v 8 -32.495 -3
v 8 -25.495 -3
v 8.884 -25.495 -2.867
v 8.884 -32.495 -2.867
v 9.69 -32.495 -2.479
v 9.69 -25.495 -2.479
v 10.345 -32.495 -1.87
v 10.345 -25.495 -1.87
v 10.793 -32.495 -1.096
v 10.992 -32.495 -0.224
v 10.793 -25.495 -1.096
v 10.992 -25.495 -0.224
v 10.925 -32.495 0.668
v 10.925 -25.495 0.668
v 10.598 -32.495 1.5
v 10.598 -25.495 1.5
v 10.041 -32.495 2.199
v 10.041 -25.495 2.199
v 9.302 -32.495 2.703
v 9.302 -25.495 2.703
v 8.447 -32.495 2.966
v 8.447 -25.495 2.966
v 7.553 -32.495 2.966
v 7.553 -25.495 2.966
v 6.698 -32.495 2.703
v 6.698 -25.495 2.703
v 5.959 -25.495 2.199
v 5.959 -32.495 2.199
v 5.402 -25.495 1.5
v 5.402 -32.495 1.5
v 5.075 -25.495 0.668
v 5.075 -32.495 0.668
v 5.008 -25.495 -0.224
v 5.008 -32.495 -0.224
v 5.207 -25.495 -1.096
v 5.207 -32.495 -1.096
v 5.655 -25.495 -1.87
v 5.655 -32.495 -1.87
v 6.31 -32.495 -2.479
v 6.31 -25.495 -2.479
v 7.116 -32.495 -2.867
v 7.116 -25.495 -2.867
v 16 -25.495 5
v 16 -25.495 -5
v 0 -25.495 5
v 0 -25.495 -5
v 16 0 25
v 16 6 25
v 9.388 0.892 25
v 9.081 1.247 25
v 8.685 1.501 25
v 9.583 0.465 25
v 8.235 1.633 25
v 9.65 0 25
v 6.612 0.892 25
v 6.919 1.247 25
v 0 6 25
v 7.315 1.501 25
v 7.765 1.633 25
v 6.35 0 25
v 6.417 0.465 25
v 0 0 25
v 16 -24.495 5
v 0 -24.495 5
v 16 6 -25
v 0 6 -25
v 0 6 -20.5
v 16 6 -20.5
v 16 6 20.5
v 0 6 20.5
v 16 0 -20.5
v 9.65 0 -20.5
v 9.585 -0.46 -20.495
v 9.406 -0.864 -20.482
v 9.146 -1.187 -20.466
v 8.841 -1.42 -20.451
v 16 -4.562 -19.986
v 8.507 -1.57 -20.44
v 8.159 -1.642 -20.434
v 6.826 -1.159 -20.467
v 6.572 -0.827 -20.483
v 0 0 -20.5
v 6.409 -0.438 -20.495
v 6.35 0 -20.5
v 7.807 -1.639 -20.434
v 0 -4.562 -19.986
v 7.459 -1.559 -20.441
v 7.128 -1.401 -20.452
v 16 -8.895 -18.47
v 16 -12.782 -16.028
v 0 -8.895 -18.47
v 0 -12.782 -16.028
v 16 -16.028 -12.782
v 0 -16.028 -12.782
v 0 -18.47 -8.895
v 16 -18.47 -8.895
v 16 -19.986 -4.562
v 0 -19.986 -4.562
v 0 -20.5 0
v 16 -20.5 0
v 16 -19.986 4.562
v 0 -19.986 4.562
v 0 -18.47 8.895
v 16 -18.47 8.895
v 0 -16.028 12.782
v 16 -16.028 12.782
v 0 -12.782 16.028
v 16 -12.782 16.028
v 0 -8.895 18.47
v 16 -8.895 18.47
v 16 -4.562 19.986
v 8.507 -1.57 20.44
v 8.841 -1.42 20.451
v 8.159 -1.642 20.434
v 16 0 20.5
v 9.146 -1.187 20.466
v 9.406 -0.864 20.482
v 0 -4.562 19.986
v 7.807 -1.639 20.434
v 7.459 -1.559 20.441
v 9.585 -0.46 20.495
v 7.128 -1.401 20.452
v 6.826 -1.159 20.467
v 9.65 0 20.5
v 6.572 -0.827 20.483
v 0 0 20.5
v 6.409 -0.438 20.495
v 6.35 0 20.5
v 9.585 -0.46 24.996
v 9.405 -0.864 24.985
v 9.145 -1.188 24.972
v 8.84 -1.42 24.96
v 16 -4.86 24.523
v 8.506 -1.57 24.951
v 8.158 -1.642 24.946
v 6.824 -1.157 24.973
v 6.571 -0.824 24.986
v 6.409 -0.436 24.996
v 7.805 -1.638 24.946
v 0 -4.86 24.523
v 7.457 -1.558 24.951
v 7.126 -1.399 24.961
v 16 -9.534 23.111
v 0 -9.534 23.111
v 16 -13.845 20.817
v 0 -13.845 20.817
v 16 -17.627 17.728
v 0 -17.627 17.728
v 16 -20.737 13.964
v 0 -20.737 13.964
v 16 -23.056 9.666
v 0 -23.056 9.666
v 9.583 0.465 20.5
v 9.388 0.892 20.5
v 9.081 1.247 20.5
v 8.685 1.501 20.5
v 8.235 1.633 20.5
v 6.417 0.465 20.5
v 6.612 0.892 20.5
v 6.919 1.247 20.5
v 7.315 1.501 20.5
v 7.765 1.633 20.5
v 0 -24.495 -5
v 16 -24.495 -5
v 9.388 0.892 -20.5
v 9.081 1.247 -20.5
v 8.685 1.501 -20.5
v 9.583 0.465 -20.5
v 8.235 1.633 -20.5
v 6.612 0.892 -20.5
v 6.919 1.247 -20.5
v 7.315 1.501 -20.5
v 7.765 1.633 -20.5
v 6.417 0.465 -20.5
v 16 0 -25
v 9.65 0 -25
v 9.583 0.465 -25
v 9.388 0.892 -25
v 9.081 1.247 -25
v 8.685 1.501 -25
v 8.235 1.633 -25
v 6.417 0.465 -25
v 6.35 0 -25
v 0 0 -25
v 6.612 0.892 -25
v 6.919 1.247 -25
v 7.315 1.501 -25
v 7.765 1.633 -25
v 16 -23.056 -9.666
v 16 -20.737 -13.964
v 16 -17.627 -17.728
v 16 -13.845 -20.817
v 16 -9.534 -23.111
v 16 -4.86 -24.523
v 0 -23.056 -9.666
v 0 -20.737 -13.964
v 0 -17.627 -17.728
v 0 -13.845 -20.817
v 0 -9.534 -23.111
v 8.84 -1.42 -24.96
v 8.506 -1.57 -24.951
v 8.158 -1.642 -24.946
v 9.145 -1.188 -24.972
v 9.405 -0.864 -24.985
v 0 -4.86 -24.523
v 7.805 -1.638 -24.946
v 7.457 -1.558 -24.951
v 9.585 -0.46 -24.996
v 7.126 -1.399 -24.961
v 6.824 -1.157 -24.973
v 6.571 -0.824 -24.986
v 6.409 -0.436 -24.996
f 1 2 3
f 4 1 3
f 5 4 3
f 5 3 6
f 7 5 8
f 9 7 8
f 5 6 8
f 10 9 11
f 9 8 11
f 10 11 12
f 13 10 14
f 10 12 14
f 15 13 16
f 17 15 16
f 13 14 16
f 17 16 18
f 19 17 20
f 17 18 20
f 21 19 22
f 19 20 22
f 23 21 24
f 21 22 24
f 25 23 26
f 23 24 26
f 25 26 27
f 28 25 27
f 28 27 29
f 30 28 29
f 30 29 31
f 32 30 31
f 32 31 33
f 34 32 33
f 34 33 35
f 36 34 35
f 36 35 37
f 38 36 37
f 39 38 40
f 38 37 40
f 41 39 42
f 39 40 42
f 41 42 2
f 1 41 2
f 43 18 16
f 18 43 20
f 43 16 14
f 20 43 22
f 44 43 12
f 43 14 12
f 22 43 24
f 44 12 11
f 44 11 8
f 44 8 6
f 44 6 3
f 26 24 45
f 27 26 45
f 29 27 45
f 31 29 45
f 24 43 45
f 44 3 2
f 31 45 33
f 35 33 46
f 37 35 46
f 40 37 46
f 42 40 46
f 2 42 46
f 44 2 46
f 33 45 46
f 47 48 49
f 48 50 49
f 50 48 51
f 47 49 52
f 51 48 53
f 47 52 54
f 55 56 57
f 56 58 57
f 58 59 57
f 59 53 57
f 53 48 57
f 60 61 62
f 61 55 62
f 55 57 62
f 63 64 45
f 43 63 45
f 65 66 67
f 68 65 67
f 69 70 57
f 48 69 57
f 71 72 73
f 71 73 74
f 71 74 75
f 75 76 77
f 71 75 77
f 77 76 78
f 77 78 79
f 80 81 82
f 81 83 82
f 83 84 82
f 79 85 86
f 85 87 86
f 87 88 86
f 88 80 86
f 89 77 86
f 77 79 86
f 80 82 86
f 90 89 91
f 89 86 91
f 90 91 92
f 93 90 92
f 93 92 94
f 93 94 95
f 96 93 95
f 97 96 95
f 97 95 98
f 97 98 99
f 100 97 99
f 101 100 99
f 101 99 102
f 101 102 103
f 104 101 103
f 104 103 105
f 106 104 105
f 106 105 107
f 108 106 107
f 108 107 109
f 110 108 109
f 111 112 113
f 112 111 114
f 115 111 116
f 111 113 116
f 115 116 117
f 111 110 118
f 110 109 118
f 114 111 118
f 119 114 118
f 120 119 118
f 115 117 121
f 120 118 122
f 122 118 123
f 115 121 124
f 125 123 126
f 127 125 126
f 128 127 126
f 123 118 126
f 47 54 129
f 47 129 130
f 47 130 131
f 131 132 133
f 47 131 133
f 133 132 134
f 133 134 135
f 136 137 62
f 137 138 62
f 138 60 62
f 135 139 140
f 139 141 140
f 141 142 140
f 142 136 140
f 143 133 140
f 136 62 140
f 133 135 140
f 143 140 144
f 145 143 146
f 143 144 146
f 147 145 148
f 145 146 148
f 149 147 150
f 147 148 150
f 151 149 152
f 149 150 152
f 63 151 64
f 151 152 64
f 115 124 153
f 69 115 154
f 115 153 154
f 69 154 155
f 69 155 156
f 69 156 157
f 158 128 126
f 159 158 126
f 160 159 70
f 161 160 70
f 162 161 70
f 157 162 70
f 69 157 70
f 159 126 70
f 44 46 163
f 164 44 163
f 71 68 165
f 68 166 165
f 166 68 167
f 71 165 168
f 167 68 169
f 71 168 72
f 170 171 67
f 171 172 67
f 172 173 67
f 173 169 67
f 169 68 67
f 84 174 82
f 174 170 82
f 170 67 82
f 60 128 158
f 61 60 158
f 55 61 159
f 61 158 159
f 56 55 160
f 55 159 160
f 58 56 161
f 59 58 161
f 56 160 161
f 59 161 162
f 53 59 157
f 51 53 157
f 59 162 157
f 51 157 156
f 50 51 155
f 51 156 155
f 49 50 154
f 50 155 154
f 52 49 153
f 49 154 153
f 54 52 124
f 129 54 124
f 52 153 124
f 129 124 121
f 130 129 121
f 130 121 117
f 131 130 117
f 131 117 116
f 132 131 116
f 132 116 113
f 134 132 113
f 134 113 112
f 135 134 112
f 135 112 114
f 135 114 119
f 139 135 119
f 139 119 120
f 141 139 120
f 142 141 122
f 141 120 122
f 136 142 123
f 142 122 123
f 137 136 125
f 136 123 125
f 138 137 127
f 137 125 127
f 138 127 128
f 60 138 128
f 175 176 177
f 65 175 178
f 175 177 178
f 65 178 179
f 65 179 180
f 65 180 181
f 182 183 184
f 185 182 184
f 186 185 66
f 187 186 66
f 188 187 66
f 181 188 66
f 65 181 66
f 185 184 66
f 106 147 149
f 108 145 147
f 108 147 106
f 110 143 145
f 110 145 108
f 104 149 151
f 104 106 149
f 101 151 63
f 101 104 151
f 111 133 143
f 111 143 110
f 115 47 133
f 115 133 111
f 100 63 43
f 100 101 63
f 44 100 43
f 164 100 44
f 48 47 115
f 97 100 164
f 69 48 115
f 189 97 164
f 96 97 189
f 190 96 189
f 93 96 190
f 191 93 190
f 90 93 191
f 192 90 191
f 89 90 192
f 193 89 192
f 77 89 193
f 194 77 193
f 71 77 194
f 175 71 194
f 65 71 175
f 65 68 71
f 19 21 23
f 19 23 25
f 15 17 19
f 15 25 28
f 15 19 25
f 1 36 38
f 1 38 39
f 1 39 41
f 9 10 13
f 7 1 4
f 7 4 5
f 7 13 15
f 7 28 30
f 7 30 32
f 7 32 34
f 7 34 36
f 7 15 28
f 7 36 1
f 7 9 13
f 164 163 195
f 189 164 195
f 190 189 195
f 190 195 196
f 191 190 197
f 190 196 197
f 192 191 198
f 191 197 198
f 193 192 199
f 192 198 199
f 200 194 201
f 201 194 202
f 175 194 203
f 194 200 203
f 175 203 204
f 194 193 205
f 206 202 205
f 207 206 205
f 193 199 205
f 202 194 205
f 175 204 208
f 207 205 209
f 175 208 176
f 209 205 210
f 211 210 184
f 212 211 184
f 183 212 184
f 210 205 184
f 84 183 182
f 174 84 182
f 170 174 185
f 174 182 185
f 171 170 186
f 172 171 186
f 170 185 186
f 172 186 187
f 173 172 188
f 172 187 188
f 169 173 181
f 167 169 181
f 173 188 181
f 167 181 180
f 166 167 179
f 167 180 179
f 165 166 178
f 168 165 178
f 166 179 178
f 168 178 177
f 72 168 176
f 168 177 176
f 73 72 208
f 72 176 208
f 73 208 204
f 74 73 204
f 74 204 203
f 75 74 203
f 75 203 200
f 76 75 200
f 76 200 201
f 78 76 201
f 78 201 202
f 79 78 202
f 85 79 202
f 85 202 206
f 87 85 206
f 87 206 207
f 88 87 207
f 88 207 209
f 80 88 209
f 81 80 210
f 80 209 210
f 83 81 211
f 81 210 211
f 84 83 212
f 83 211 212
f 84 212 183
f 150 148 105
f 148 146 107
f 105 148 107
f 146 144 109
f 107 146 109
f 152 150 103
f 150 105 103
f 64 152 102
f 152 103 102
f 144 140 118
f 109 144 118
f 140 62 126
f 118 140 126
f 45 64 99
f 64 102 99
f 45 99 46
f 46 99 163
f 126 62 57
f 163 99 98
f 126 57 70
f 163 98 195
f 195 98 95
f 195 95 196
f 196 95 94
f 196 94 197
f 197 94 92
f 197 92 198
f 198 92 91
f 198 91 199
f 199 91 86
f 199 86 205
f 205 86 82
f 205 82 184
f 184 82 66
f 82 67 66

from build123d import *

# Parameters (mm, degrees)
BOSS_EXTRUDE1_DEPTH = 16
SKETCH4_R           = 3
BOSS_EXTRUDE2_DEPTH = 7
SKETCH5_R           = 1.65
CUT_EXTRUDE1_DEPTH  = 62.740735004


with BuildPart() as part:
    # Sketch1 → Boss-Extrude1 (new body)
    with BuildSketch(Plane(origin=(0, 0, 0), x_dir=(0, 0, -1), z_dir=(1, 0, 0))):
        with BuildLine():
            Line((-5, -24.494897428), (-5, -25.494897428))
            Line((-5, -25.494897428), (5, -25.494897428))
            Line((5, -25.494897428), (5, -24.494897428))
            ThreePointArc((5, -24.494897428), (19.364916731, -15.811388301), (25, 0))
            Line((25, 0), (25, 6))
            Line((25, 6), (20.5, 6))
            Line((20.5, 6), (20.5, 0))
            ThreePointArc((20.5, 0), (0, -20.5), (-20.5, 0))
            Line((-20.5, 0), (-20.5, 6))
            Line((-20.5, 6), (-25, 6))
            Line((-25, 6), (-25, 0))
            ThreePointArc((-25, 0), (-19.364916731, -15.811388301), (-5, -24.494897428))
        make_face()
    extrude(amount=BOSS_EXTRUDE1_DEPTH)

    # Sketch4 → Boss-Extrude2 (add)
    with BuildSketch(Plane.XZ.offset(25.494897428)):
        with Locations(Location((8, 0, 0), (0, 0, 270))):
            Circle(SKETCH4_R)
    extrude(amount=BOSS_EXTRUDE2_DEPTH)

    # Sketch5 → Cut-Extrude1 (cut, through all)
    with BuildSketch(Plane(origin=(0, 0, -25), x_dir=(-1, 0, 0), z_dir=(0, 0, -1))):
        with Locations((-8, 0)):
            Circle(SKETCH5_R)
    extrude(amount=-CUT_EXTRUDE1_DEPTH, mode=Mode.SUBTRACT)


solid = part.part
